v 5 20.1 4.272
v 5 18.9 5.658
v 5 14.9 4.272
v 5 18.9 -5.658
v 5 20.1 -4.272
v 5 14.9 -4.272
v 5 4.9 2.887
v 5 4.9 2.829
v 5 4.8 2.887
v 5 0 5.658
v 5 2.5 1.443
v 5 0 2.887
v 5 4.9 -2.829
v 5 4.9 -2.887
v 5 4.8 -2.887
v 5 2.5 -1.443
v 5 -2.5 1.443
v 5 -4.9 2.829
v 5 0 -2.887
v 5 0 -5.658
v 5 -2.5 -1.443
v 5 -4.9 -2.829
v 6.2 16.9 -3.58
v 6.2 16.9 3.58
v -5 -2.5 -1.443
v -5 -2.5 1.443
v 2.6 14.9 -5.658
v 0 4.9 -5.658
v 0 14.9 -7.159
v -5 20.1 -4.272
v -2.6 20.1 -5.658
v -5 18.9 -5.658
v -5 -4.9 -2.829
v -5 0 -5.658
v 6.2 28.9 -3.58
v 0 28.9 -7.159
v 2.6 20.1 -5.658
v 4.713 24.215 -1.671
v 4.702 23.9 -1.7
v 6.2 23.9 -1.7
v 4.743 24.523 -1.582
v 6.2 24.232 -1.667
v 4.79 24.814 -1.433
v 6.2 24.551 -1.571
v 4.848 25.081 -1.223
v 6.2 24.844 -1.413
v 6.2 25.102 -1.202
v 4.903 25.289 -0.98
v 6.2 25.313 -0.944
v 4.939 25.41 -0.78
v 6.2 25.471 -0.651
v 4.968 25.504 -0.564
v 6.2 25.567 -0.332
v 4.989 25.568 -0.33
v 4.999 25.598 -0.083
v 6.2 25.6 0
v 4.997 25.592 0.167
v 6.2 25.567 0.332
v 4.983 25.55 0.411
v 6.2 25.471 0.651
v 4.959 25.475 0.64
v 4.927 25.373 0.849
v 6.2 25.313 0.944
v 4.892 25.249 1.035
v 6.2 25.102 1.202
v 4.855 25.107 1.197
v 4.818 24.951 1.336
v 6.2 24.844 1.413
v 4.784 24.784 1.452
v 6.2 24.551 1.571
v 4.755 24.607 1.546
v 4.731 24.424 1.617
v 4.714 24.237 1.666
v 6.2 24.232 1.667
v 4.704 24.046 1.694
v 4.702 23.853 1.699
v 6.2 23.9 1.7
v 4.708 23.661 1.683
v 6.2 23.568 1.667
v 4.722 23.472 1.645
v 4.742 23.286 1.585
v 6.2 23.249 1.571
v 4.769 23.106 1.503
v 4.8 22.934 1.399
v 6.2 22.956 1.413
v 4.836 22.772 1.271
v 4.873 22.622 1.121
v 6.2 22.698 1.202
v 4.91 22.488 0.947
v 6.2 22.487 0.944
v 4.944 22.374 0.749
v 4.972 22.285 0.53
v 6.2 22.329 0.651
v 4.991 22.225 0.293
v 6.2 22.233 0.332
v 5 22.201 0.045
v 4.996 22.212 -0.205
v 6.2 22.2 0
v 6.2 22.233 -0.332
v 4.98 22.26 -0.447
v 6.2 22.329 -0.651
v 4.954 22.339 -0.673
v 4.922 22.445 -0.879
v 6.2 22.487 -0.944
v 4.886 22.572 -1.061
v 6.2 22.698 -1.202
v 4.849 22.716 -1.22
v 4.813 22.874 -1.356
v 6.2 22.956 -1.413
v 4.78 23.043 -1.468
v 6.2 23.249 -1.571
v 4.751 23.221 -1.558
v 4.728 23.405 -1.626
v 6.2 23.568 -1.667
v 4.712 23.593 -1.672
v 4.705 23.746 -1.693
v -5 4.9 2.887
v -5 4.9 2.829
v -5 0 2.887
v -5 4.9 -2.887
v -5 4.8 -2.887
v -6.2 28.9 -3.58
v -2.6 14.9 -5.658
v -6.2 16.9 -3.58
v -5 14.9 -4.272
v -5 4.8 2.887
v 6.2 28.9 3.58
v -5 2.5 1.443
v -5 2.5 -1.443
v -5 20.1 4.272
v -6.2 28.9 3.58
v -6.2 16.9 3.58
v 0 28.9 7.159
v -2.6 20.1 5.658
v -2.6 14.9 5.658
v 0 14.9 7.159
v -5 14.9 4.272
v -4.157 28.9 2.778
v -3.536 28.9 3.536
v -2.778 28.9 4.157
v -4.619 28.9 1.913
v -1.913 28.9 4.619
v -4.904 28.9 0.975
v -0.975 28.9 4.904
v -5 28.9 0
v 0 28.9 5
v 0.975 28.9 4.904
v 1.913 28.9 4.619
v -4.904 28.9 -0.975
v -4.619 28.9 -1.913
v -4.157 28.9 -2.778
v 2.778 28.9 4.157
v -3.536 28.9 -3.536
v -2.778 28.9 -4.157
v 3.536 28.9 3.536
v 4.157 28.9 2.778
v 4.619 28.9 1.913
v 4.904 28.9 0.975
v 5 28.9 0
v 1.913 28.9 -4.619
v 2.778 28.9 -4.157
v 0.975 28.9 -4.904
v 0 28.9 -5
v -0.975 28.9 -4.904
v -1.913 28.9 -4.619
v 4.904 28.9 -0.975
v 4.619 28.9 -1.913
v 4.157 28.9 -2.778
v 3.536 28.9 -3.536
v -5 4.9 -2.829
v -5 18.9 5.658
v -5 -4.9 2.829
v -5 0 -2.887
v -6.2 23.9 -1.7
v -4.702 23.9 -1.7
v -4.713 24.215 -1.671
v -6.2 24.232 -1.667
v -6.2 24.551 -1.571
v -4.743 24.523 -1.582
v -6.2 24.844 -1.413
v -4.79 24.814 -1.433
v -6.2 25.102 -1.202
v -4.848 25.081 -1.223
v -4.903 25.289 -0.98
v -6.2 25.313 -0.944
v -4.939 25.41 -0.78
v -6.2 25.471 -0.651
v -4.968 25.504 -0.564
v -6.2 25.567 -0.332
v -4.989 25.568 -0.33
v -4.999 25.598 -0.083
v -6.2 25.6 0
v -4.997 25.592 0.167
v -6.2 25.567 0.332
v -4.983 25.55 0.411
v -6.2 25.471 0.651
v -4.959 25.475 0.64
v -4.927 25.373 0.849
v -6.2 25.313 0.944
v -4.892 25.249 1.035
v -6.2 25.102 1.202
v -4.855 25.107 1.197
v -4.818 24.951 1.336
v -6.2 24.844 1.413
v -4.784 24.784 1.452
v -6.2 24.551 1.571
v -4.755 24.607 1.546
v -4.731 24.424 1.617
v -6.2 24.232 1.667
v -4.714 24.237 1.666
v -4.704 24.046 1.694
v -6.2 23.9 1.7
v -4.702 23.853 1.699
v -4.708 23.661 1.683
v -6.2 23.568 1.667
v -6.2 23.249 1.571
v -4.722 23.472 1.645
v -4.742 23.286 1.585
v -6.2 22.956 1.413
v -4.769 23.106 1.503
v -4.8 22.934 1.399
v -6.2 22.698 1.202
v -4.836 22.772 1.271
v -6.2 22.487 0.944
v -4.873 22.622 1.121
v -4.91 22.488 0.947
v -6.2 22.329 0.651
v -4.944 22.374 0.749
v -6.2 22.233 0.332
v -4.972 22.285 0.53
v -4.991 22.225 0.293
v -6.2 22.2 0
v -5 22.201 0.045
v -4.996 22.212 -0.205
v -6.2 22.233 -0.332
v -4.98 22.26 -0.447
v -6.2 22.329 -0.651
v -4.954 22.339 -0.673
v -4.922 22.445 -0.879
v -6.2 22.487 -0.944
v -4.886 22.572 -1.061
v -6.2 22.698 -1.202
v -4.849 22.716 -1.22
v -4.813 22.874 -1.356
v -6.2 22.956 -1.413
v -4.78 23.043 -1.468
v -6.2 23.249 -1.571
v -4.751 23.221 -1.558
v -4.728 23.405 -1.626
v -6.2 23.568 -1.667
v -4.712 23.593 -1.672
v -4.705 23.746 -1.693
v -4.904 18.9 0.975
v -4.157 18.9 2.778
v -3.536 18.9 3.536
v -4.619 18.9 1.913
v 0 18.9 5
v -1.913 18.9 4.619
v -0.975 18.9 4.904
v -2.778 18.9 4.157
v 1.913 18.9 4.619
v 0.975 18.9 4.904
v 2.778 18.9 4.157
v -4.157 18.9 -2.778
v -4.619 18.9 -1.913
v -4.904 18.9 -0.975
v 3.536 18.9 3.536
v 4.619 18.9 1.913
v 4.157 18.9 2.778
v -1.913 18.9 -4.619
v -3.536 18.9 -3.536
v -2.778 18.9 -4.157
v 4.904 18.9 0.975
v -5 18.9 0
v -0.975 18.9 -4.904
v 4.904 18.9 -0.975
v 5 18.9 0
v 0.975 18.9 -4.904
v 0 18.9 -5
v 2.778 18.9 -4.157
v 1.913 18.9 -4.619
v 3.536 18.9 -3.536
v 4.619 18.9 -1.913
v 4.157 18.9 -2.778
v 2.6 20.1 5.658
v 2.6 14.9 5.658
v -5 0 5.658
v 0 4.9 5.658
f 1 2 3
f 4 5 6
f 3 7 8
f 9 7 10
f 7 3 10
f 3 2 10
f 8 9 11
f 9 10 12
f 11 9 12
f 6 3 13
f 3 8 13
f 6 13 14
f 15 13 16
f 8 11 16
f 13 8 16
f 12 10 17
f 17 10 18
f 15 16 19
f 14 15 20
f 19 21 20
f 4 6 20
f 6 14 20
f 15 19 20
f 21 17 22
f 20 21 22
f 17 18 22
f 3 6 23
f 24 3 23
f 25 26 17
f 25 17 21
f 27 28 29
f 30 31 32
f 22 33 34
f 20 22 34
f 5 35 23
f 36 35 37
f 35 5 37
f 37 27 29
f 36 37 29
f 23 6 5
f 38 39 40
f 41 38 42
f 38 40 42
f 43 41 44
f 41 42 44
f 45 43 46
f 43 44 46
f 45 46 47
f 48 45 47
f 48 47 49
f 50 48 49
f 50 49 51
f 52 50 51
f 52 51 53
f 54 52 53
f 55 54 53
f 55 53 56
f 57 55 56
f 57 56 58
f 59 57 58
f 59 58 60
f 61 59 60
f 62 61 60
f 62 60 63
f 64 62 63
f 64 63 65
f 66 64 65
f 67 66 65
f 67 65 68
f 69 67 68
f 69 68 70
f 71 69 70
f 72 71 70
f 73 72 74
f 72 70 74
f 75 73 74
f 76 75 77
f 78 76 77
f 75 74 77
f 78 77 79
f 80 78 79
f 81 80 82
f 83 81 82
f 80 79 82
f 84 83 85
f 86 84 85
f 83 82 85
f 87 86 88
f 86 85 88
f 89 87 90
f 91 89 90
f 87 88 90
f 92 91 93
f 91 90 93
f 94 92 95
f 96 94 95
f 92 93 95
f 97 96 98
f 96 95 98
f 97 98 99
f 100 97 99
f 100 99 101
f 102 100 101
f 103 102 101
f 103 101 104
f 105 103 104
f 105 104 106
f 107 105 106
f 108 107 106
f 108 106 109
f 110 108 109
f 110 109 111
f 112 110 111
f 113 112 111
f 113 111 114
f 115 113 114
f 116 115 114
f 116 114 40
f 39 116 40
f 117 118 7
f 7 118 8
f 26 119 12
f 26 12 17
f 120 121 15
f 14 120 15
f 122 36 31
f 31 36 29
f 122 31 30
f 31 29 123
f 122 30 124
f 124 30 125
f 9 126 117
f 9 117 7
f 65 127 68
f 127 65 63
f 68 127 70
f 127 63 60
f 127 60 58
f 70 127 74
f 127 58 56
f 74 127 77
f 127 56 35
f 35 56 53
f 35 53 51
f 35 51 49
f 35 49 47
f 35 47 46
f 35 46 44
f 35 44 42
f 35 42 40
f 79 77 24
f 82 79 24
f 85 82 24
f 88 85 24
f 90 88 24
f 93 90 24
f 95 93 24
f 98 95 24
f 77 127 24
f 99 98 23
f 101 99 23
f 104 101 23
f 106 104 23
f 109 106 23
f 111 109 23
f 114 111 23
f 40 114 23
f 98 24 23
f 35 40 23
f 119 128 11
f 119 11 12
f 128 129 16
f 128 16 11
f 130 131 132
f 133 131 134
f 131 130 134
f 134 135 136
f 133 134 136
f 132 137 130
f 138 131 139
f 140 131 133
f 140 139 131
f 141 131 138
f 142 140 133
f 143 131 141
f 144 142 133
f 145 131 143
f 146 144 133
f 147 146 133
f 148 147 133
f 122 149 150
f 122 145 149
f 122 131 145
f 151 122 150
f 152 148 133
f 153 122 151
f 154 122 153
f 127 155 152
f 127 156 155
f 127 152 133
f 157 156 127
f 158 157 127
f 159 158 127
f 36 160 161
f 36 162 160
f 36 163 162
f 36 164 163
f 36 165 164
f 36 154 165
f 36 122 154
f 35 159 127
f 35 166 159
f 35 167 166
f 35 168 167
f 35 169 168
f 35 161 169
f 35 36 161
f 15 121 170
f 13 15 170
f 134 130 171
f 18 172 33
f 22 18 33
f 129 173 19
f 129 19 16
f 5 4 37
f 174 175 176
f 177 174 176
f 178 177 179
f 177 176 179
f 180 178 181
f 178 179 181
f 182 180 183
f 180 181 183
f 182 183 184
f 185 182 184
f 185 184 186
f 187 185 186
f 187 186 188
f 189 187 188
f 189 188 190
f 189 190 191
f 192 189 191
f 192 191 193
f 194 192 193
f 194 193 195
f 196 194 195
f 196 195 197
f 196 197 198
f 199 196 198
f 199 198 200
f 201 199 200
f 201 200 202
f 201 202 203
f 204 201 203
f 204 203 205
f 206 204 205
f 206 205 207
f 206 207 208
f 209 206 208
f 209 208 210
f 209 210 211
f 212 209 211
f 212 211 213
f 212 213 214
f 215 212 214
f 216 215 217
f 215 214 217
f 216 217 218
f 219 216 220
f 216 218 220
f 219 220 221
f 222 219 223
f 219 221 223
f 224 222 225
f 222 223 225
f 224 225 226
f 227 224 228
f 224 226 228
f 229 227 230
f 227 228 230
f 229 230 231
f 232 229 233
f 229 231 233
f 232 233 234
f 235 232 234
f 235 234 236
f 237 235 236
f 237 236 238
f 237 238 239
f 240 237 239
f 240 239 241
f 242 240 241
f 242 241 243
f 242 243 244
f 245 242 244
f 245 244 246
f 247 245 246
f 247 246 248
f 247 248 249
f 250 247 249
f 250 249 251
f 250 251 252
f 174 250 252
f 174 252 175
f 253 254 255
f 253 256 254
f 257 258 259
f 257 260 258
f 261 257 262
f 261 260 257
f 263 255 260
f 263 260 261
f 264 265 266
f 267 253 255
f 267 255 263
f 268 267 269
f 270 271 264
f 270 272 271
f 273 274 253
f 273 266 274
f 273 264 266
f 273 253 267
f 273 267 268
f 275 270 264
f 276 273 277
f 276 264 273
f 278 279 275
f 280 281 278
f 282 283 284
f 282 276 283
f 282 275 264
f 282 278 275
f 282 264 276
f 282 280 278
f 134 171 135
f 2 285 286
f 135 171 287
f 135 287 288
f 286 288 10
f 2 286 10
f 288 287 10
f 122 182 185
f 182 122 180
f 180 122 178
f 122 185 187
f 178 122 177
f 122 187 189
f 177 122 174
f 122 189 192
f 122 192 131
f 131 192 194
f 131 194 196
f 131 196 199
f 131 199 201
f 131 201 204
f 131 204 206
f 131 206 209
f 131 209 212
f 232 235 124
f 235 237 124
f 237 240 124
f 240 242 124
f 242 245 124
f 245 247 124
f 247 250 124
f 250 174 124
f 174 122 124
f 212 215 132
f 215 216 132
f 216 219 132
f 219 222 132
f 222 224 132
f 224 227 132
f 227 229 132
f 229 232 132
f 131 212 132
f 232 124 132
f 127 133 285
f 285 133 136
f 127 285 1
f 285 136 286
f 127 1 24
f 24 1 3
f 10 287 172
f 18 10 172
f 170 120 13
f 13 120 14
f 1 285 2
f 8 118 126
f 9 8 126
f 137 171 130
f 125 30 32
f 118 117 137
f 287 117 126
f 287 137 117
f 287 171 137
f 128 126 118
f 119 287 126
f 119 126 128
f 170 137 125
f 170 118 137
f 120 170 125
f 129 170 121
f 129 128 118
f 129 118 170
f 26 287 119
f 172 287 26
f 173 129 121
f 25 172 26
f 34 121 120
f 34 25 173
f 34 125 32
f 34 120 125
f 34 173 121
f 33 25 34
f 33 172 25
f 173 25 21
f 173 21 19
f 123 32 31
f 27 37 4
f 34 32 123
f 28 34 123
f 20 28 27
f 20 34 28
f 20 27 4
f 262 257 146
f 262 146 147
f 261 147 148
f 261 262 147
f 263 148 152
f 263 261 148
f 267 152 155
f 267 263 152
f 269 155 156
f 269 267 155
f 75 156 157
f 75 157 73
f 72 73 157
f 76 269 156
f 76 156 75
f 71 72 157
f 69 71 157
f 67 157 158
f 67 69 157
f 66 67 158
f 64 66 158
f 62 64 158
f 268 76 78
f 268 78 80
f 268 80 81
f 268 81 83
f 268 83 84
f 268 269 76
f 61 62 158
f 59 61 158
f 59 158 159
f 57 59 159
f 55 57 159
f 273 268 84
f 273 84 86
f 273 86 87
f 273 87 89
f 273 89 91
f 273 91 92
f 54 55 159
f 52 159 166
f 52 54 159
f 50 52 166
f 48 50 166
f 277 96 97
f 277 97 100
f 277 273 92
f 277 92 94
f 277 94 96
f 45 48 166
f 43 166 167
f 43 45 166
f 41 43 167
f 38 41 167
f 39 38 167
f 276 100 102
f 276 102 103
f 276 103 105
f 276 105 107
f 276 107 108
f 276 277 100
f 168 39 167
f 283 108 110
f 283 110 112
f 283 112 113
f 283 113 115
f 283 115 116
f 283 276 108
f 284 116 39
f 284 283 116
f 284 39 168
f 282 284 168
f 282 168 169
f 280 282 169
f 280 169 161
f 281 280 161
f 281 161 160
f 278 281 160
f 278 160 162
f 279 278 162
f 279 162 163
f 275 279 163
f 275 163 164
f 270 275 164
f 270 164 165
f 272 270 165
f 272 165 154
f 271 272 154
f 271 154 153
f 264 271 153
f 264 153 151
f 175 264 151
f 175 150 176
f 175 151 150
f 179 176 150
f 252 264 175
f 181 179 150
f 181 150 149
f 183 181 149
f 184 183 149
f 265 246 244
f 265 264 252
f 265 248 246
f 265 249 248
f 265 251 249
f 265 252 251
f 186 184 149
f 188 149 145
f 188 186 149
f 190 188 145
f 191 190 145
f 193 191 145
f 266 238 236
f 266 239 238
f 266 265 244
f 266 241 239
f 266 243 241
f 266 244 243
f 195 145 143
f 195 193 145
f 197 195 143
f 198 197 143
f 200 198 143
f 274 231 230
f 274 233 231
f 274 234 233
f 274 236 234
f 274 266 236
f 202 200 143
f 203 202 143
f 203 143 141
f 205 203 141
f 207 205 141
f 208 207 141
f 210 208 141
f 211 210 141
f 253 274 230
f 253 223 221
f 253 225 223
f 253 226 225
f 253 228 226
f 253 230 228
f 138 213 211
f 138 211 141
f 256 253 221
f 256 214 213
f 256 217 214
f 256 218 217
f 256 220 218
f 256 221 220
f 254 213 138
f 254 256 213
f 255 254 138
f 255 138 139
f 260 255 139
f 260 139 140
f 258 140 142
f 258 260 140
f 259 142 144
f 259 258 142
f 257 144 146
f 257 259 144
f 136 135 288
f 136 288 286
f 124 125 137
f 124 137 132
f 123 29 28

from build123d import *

# Parameters (mm, degrees)
SALIENTE_EXTRUIR1_DEPTH      = 5
SALIENTE_EXTRUIR1_DEPTH_BACK = 5
SALIENTE_EXTRUIR2_START      = 14
CROQUIS2_R                   = 5
SALIENTE_EXTRUIR2_DEPTH      = 10
CROQUIS4_W                   = 10
CROQUIS4_H                   = 2.771281292
SALIENTE_EXTRUIR3_DEPTH      = 18.9
CHAFL_N1_SIZE                = 1.2
CROQUIS5_R                   = 1.7
CORTAR_EXTRUIR1_DEPTH        = 33.252493444
CROQUIS2_4_R                 = 5
SALIENTE_EXTRUIR8_DEPTH      = 14
CHAFL_N2_SIZE                = 10
CHAFL_N2_SIZE_2              = 1.3
CORTAR_EXTRUIR2_DEPTH        = 31.412223535
CORTAR_EXTRUIR2_DEPTH_BACK   = 31.412223535


# Some blends are built 0.0001 mm under size
with BuildPart() as part:
    # Croquis1 → Saliente-Extruir1 (new, two sides: drawn at the far end of the back side and taken through both)
    with BuildSketch(Plane(origin=(0, 0, 0), x_dir=(0, 0, -1), z_dir=(1, 0, 0)).offset(-SALIENTE_EXTRUIR1_DEPTH_BACK)):
        Polygon((2.829016319, 4.9), (-2.829016319, 4.9), (-5.658032638, 0), (-2.829016319, -4.9), (2.829016319, -4.9), (5.658032638, 0), align=None)
        Polygon((2.886751346, 0), (1.443375673, 2.5), (-1.443375673, 2.5), (-2.886751346, 0), (-1.443375673, -2.5), (1.443375673, -2.5), align=None, mode=Mode.SUBTRACT)
    extrude(amount=SALIENTE_EXTRUIR1_DEPTH + SALIENTE_EXTRUIR1_DEPTH_BACK)



with BuildPart() as body_2:
    # Croquis2 → Saliente-Extruir2 (new body)
    with BuildSketch(Plane(origin=(0, 4.9, 0), x_dir=(1, 0, 0), z_dir=(0, 1, 0)).offset(SALIENTE_EXTRUIR2_START)):
        Polygon((0, 7.159143338), (-6.2, 3.579571669), (-6.2, -3.579571669), (0, -7.159143338), (6.2, -3.579571669), (6.2, 3.579571669), align=None)
        with Locations(Location((0, 0, 0), (0, 0, 270))):
            Circle(CROQUIS2_R, mode=Mode.SUBTRACT)
    extrude(amount=SALIENTE_EXTRUIR2_DEPTH)


with BuildPart() as part_1:
    add(part.part)

    add(body_2.part)  # Saliente-Extruir3 merges body 2
    # Croquis4 → Saliente-Extruir3 (add)
    with BuildSketch(Plane(origin=(0, 0, 0), x_dir=(1, 0, 0), z_dir=(0, 1, 0))):
        with Locations((0, -4.272391992)):
            Rectangle(CROQUIS4_W, CROQUIS4_H)
        with Locations((0, 4.272391992)):
            Rectangle(CROQUIS4_W, CROQUIS4_H)
    extrude(amount=SALIENTE_EXTRUIR3_DEPTH)

    # Chaflán1
    chafl_n1_edges = [part_1.edges().sort_by_distance(p)[0] for p in [
        (3.8, 18.9, 4.965212315),
        (-3.8, 18.9, 4.965212315),
        (-3.8, 18.9, -4.965212315),
        (3.8, 18.9, -4.965212315),
    ]]
    chamfer(chafl_n1_edges, length=CHAFL_N1_SIZE - 0.0001)  # a hair under: the kernel refuses the full size

    # Croquis5 → Cortar-Extruir1 (cut, through all)
    with BuildSketch(Plane(origin=(6.2, 0, 0), x_dir=(0, 0, -1), z_dir=(1, 0, 0))):
        with Locations((0, 23.9)):
            Circle(CROQUIS5_R)
    extrude(amount=-CORTAR_EXTRUIR1_DEPTH, mode=Mode.SUBTRACT)

    # Croquis2<4> → Saliente-Extruir8 (add)
    # profile 1 of 2: a face of its own
    with BuildSketch(Plane(origin=(0, 4.9, 0), x_dir=(1, 0, 0), z_dir=(0, 1, 0))):
        Polygon((6.2, -3.579571669), (6.2, 3.579571669), (0, 7.159143338), (-6.2, 3.579571669), (-6.2, -3.579571669), (0, -7.159143338), align=None)
        with Locations(Location((0, 0, 0), (0, 0, 270))):
            Circle(CROQUIS2_4_R, mode=Mode.SUBTRACT)
    # profile 2 of 2: a face of its own
    with BuildSketch(Plane(origin=(0, 4.9, 0), x_dir=(1, 0, 0), z_dir=(0, 1, 0))):
        with Locations(Location((0, 0, 0), (0, 0, 270))):
            Circle(CROQUIS2_4_R)
    extrude(amount=SALIENTE_EXTRUIR8_DEPTH)

    # Chaflán2
    # the kernel refuses this chamfer: 10, 1.3 mm, written as the material it takes off along each edge
    with BuildSketch(Plane(origin=(-25.109710919, 4.9, -7.33795502), x_dir=(-0.00247990444519022, 0.9999877000722412, 0.004295320496985479), z_dir=(0.8660254037844387, 0, 0.5000000000000001))) as chafl_n2_piece_1_section:
        Polygon((CHAFL_N2_SIZE * 0.999987700072, -CHAFL_N2_SIZE * 0.00495980889038), (-CHAFL_N2_SIZE_2 * 0.00495980889038, -CHAFL_N2_SIZE_2 * 0.999987700072), (0, 0), align=None)
    chafl_n2_piece_1 = extrude(amount=54.986172033, mode=Mode.PRIVATE)
    chafl_n2_piece_1 = split(chafl_n2_piece_1, bisect_by=Plane(origin=(-0.715, 8.4, 5.658032638), z_dir=(0, 0, 1)), keep=Keep.TOP, mode=Mode.PRIVATE)
    add(chafl_n2_piece_1, mode=Mode.SUBTRACT)
    with BuildSketch(Plane(origin=(-22.509710919, 4.9, 20.155130996), x_dir=(-0.47976503705991164, -0.28160617333362153, -0.8309774198829328), z_dir=(0.8660254037844388, 0, -0.49999999999999967))) as chafl_n2_piece_2_section:
        Polygon((CHAFL_N2_SIZE_2 * 0.95953007412, CHAFL_N2_SIZE_2 * 0.281606173334), (-CHAFL_N2_SIZE * 0.281606173334, CHAFL_N2_SIZE * 0.95953007412), (0, 0), align=None)
    chafl_n2_piece_2 = extrude(amount=54.986172033, mode=Mode.PRIVATE)
    chafl_n2_piece_2 = split(chafl_n2_piece_2, bisect_by=Plane(origin=(0.715, 8.4, 5.658032638), z_dir=(0, 0, 1)), keep=Keep.TOP, mode=Mode.PRIVATE)
    add(chafl_n2_piece_2, mode=Mode.SUBTRACT)
    with BuildSketch(Plane(origin=(22.509710919, 4.9, -20.155130996), x_dir=(-0.002479904445190118, 0.9999877000722412, -0.004295320496985084), z_dir=(-0.8660254037844387, 0, 0.49999999999999994))) as chafl_n2_piece_3_section:
        Polygon((CHAFL_N2_SIZE * 0.999987700072, -CHAFL_N2_SIZE * 0.00495980889038), (-CHAFL_N2_SIZE_2 * 0.00495980889038, -CHAFL_N2_SIZE_2 * 0.999987700072), (0, 0), align=None)
    chafl_n2_piece_3 = extrude(amount=54.986172033, mode=Mode.PRIVATE)
    chafl_n2_piece_3 = split(chafl_n2_piece_3, bisect_by=Plane(origin=(-0.715, 8.4, -5.658032638), z_dir=(0, 0, -1)), keep=Keep.TOP, mode=Mode.PRIVATE)
    add(chafl_n2_piece_3, mode=Mode.SUBTRACT)
    with BuildSketch(Plane(origin=(25.109710919, 4.9, 7.33795502), x_dir=(-0.4797650370599119, -0.28160617333362137, 0.8309774198829327), z_dir=(-0.8660254037844387, 0, -0.5000000000000001))) as chafl_n2_piece_4_section:
        Polygon((CHAFL_N2_SIZE_2 * 0.95953007412, CHAFL_N2_SIZE_2 * 0.281606173334), (-CHAFL_N2_SIZE * 0.281606173334, CHAFL_N2_SIZE * 0.95953007412), (0, 0), align=None)
    chafl_n2_piece_4 = extrude(amount=54.986172033, mode=Mode.PRIVATE)
    chafl_n2_piece_4 = split(chafl_n2_piece_4, bisect_by=Plane(origin=(0.715, 8.4, -5.658032638), z_dir=(0, 0, -1)), keep=Keep.TOP, mode=Mode.PRIVATE)
    add(chafl_n2_piece_4, mode=Mode.SUBTRACT)

    # Croquis6 → Cortar-Extruir2 (cut, two sides: drawn at the far end of the back side and taken through both)
    with BuildSketch(Plane.XY.offset(-CORTAR_EXTRUIR2_DEPTH_BACK)):
        Polygon((5, 14.9), (6.2, 16.9), (6.2, 4.9), (5, 4.9), align=None)
        Polygon((-6.2, 4.9), (-5, 4.9), (-5, 14.9), (-6.2, 16.9), align=None)
    extrude(amount=CORTAR_EXTRUIR2_DEPTH + CORTAR_EXTRUIR2_DEPTH_BACK, mode=Mode.SUBTRACT)


solid = part_1.part
